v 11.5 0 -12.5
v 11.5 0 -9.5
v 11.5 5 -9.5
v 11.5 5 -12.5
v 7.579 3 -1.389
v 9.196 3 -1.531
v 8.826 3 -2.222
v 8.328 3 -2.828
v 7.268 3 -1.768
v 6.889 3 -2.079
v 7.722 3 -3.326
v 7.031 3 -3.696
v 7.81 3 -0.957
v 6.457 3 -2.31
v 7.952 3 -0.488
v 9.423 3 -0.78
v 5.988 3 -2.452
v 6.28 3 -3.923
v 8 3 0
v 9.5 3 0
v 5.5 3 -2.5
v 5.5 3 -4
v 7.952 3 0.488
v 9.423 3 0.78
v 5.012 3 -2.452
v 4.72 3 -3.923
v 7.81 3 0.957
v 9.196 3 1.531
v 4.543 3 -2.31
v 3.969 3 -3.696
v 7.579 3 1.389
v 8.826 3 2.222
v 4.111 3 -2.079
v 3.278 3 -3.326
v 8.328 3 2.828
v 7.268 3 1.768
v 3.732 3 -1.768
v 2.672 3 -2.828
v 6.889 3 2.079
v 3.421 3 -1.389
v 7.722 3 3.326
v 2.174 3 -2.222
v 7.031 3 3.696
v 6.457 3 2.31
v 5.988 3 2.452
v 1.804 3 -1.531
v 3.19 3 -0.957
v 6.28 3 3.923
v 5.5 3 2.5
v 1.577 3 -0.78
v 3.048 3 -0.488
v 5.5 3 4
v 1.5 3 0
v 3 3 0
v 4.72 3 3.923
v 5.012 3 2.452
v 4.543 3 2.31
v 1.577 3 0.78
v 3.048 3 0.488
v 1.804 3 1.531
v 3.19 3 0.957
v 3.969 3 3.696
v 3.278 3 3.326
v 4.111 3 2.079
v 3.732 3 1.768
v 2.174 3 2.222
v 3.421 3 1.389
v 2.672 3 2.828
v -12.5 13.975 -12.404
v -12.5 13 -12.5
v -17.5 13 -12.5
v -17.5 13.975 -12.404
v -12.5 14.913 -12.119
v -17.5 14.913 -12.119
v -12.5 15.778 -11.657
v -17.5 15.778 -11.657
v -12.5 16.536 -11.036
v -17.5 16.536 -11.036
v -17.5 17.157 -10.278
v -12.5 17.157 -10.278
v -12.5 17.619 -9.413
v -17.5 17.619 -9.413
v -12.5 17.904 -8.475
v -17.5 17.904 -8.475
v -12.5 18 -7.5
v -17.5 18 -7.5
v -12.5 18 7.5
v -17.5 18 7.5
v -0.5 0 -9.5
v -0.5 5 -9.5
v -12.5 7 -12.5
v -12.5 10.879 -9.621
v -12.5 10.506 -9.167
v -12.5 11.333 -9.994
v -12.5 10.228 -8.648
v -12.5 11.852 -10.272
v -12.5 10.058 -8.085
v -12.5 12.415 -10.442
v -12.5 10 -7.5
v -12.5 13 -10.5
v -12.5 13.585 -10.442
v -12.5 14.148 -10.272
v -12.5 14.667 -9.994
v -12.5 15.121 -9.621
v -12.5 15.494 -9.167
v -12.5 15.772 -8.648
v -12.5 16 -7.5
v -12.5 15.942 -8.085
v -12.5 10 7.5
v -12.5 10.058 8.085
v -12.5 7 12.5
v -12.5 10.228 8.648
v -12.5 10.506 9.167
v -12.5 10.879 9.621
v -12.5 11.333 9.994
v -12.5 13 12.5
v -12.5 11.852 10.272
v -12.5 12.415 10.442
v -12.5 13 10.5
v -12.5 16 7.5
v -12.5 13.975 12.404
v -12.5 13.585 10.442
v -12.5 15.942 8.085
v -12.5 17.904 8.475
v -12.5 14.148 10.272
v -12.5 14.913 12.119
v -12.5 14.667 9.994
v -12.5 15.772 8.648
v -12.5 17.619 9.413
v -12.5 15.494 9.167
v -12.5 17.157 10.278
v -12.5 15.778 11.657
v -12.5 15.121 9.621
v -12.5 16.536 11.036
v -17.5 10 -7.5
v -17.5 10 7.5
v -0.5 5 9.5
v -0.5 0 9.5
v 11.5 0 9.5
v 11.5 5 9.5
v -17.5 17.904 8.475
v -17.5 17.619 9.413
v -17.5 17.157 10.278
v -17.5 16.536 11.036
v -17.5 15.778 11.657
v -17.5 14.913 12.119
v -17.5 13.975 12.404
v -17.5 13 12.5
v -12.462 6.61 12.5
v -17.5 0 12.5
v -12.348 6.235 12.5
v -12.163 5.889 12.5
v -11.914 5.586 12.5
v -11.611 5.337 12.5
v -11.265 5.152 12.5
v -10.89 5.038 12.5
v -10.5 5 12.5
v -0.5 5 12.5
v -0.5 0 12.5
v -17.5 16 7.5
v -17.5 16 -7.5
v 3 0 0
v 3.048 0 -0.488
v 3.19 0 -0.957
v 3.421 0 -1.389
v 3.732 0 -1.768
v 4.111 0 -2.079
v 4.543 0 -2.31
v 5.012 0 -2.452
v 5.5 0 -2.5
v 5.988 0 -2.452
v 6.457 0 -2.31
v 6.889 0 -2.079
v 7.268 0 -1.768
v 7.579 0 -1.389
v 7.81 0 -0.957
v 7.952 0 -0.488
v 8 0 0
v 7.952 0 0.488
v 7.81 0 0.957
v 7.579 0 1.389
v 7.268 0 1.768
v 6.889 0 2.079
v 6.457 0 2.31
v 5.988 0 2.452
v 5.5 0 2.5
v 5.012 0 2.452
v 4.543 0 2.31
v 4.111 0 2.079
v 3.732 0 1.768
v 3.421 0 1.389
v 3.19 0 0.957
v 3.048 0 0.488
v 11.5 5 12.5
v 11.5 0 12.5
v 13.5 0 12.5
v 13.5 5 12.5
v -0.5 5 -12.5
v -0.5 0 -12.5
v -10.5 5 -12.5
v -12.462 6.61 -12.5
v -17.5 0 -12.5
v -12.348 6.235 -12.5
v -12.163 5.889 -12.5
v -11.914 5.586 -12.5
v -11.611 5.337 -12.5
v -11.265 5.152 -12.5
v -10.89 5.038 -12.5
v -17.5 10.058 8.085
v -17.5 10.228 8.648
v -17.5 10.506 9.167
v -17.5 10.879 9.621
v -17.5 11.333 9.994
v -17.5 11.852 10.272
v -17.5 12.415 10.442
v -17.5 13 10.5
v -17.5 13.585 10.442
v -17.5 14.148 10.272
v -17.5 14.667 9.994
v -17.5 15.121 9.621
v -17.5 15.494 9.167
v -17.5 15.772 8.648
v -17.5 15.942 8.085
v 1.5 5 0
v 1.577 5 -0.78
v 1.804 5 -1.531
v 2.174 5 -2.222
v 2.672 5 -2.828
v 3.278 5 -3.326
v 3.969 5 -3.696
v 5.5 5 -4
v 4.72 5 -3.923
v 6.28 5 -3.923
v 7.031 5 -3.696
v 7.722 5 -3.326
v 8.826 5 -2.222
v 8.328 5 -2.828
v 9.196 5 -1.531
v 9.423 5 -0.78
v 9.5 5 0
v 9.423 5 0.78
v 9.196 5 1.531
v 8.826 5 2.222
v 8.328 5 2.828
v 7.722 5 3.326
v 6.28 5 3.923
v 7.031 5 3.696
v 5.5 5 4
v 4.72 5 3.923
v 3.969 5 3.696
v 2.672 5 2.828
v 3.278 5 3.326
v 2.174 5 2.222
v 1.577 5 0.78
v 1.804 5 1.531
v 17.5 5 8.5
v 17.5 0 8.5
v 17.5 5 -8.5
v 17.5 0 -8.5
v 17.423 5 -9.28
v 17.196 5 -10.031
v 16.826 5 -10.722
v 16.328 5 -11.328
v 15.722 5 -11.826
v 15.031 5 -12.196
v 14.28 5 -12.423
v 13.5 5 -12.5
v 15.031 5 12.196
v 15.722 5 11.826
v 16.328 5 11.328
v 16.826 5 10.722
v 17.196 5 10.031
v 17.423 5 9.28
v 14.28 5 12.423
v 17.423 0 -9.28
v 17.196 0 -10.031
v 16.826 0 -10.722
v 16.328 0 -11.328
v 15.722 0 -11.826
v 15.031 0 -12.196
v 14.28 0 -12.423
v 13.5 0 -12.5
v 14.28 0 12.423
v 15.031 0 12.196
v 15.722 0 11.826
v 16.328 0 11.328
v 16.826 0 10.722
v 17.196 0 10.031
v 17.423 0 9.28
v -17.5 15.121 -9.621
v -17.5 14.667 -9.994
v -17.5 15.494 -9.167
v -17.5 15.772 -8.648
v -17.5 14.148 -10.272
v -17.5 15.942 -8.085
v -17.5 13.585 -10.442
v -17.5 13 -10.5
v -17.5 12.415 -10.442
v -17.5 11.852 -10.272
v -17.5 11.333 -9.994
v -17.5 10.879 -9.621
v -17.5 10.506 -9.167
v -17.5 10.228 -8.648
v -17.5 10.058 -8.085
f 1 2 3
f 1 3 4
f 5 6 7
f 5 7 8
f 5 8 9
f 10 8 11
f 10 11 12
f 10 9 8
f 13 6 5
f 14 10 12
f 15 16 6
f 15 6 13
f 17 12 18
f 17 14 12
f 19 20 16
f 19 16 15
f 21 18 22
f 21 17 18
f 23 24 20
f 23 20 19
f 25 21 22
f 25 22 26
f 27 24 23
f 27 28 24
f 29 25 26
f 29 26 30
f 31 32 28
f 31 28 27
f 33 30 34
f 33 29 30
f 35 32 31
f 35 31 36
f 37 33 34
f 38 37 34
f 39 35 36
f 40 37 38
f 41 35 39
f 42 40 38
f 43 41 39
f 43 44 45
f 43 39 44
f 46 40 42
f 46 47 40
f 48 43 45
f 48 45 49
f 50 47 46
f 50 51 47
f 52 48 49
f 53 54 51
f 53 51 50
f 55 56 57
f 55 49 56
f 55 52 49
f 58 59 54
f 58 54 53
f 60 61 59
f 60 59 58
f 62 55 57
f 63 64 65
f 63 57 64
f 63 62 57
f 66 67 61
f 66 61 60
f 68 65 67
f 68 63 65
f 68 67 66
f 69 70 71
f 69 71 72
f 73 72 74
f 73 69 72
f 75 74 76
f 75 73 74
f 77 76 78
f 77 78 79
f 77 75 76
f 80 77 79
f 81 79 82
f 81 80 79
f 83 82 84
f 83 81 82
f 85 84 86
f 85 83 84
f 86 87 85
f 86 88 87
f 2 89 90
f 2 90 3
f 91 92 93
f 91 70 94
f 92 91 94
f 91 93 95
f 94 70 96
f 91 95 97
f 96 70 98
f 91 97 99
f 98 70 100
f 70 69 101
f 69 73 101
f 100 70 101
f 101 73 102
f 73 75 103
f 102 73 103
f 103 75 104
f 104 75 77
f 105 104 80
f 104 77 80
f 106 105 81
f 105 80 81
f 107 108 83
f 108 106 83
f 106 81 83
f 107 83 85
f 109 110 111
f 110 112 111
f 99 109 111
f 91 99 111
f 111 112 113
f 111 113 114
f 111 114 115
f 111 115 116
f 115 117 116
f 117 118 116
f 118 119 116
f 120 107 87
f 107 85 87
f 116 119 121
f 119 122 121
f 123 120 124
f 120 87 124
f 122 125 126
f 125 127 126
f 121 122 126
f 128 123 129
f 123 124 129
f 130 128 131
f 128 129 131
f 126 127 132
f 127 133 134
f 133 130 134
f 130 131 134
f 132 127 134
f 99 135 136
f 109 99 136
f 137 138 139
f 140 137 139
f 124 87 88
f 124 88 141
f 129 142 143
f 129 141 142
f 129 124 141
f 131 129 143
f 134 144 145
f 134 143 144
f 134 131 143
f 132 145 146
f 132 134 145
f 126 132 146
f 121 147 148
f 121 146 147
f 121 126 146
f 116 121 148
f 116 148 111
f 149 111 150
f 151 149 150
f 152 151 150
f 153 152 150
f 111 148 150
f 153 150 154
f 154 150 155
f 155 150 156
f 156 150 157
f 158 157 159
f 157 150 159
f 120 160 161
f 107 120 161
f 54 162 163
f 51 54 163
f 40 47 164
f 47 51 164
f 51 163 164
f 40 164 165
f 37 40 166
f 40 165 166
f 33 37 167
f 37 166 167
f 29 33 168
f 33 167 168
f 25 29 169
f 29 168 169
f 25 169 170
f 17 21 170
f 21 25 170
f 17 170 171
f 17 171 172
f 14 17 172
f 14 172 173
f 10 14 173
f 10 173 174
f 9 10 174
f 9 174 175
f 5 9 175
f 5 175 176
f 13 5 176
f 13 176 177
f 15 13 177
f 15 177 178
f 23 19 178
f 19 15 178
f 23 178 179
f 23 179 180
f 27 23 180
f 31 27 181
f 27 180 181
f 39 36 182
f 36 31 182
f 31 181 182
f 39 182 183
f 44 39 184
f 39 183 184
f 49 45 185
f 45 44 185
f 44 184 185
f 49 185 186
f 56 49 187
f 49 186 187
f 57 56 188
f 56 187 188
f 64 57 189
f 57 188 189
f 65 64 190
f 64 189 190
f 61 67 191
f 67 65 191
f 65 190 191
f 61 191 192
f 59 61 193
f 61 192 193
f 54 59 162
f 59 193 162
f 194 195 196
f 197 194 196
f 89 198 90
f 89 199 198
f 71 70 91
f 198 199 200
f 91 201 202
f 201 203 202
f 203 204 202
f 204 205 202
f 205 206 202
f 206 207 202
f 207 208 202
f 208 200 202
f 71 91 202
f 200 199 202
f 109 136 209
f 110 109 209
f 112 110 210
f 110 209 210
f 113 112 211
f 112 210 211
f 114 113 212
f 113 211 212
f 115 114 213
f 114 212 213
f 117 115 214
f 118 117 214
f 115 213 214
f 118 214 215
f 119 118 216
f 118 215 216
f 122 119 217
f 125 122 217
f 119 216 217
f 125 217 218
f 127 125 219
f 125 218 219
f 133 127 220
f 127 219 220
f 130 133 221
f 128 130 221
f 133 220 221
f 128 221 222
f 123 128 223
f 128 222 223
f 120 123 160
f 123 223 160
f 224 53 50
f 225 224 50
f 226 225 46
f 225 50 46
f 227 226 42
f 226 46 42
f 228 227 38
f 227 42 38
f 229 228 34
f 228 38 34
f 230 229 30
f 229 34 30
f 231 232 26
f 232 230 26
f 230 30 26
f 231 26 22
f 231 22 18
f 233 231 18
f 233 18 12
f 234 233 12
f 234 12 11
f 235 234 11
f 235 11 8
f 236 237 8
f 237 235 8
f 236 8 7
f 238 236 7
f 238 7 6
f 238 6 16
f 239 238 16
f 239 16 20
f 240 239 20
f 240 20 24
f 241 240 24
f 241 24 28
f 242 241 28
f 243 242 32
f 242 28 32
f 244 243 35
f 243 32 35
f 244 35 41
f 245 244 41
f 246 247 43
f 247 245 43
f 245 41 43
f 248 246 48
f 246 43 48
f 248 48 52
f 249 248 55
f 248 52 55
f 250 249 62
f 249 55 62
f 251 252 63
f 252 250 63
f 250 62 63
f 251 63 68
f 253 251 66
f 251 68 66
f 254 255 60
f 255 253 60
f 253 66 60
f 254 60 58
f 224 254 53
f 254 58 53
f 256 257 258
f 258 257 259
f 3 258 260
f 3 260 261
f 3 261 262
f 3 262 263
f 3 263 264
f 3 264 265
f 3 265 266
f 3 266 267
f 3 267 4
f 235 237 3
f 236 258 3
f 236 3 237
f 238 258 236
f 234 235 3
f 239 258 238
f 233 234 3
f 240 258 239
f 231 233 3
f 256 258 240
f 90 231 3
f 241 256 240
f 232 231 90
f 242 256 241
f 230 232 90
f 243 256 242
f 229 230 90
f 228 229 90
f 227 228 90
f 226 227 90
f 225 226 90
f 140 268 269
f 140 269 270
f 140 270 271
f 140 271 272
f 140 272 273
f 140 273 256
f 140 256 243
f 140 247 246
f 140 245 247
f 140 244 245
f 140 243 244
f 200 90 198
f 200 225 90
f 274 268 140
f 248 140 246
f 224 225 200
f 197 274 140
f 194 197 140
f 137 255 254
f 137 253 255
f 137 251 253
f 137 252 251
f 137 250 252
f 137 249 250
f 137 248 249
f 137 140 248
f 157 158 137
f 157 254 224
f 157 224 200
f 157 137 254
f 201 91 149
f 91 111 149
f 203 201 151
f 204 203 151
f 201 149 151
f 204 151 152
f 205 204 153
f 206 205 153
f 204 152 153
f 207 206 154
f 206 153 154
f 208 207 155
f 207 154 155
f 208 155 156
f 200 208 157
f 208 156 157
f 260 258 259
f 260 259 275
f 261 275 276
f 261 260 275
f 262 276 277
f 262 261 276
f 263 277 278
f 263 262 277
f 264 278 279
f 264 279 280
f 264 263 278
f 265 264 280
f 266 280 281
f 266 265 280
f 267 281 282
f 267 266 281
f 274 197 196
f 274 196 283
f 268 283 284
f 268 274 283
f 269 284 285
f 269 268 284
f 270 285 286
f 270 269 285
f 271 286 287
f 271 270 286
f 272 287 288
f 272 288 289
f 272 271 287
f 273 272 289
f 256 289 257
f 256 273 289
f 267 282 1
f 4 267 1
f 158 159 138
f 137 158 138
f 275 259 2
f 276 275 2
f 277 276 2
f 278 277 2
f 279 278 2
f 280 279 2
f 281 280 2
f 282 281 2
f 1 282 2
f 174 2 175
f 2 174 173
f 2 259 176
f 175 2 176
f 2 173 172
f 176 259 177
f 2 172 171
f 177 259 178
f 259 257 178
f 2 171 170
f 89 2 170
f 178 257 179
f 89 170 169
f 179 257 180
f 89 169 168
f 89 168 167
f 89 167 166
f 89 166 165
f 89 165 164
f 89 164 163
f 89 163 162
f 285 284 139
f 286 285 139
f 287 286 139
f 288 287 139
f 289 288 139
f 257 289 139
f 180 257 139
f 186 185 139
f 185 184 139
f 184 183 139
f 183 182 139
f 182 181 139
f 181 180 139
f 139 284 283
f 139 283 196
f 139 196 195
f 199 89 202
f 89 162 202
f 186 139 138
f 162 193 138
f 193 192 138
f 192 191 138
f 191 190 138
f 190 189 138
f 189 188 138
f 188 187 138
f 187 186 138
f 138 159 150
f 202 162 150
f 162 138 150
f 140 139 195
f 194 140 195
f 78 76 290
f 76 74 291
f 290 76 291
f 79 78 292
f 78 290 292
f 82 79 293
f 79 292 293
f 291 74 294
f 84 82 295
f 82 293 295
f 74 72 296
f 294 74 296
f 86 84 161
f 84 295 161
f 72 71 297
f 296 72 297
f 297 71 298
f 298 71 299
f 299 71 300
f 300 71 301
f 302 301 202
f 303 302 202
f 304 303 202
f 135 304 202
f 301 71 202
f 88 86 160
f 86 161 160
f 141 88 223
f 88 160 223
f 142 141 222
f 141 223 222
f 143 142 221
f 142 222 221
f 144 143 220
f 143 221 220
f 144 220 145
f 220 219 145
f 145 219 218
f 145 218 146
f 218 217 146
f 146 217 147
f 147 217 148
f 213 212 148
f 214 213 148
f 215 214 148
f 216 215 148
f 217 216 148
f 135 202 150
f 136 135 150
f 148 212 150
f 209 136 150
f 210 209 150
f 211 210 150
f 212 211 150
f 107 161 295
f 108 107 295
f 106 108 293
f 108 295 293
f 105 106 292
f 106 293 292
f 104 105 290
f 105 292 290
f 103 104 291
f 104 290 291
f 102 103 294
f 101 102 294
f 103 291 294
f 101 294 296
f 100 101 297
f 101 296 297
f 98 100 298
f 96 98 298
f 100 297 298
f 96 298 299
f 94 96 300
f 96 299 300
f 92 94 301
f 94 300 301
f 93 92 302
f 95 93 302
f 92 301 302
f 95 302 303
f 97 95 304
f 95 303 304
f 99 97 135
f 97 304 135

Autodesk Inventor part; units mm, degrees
ref_plane "YZ Plane" through (0, 0, 0) normal (1, 0, 0) x (0, 1, 0)
ref_plane "XZ Plane" through (0, 0, 0) normal (0, 1, 0) x (-1, 0, 0)
ref_plane "XY Plane" through (0, 0, 0) normal (0, 0, 1) x (1, 0, 0)
sketch "Sketch1" plane through (0, 0, 0) normal (0, 1, 0) x (-1, 0, 0)
  line L0 (-17.5, -12.5) -> (17.5, -12.5)
  line L1 (17.5, -12.5) -> (17.5, 12.5)
  line L2 (17.5, 12.5) -> (-17.5, 12.5)
  line L3 (-17.5, 12.5) -> (-17.5, -12.5)
  line L4 (-17.5, -12.5) -> (17.5, 12.5) construction
  line L5 (17.5, -12.5) -> (-17.5, 12.5) construction
  line L6 (-17.5, 0) -> (17.5, 0) construction
  line L7 (0.5, 12.5) -> (0.5, 9.5)
  line L8 (0.5, 9.5) -> (-11.5, 9.5)
  line L9 (-11.5, 9.5) -> (-11.5, 12.5)
  line L10 (-11.5, 15.5) -> (0.5, 9.5) construction
  line L11 (0.5, 15.5) -> (-11.5, 9.5) construction
  line L12 (0.5, -12.5) -> (0.5, -9.5)
  line L13 (0.5, -9.5) -> (-11.5, -9.5)
  line L14 (-11.5, -9.5) -> (-11.5, -12.5)
  circle A0 centre (-5.5, 0) radius 4
  point P0 (0, 0)
  point P1 (-5.5, 12.5)
  dimension "d0" = 35
  dimension "d1" = 25
  dimension "d2" = 6
  dimension "d3" = 12
  dimension "d4" = 6
  dimension "d5" = 19
  dimension "d6" = 8
extrude "Extrusion1" add sketch "Sketch1" along normal blind 5 contours L3 L2 L9 L8 L7 L1 L0 L12 L13 L14
sketch "Sketch2" plane through (-17.5, 0, -12.5) normal (-1, 0, 0) x (0, 0, 1)
  line L0 (22, 0) -> (25, 0) projected
  line L1 (0, 0) -> (25, 0)
  line L2 (25, 0) -> (25, 18)
  line L3 (25, 18) -> (0, 18)
  line L4 (0, 18) -> (0, 0)
  point P0 (12.5, 0)
  dimension "d9" = 18
  dimension "d10" = 25
extrude "Extrusion2" add sketch "Sketch2" against normal blind 5
sketch "Sketch3" plane through (-17.5, 0, -12.5) normal (-1, 0, 0) x (0, 0, 1)
  line L0 (5, 13) -> (20, 13) construction
  line L1 (5, 10) -> (20, 10)
  line L2 (20, 16) -> (5, 16)
  arc A0 (5, 16) -> (5, 10) centre (5, 13) ccw
  arc A1 (20, 10) -> (20, 16) centre (20, 13) ccw
  line L3 (0, 0) -> (0, 18) projected
  line L4 (25, 18) -> (0, 18) projected
  point P0 (12.5, 0)
  point P1 (12.5, 13)
  dimension "d16" = 12.5
  dimension "d17" = 15
  dimension "d18" = 5
  dimension "d19" = 3
extrude "Extrusion3" cut sketch "Sketch3" against normal blind 5
sketch "Sketch4" plane through (0, 0, 0) normal (0, 1, 0) x (-1, 0, 0)
  circle A0 centre (-5.5, 0) radius 4 projected
  circle A1 centre (-5.5, 0) radius 2.5
  point P0 (0, 0)
  dimension "d22" = 5
extrude "Extrusion4" add sketch "Sketch4" along normal blind 3
fillet "Fillet1" radius 5 2 edges at (-15, 18, 12.5) (-15, 18, -12.5)
fillet "Fillet2" radius 2 1 edges at (-12.5, 5, 0)
fillet "Fillet3" radius 4 2 edges at (17.5, 2.5, 12.5) (17.5, 2.5, -12.5)
properties part number "ejercicio 266" material "Thermoplastic Resin"
